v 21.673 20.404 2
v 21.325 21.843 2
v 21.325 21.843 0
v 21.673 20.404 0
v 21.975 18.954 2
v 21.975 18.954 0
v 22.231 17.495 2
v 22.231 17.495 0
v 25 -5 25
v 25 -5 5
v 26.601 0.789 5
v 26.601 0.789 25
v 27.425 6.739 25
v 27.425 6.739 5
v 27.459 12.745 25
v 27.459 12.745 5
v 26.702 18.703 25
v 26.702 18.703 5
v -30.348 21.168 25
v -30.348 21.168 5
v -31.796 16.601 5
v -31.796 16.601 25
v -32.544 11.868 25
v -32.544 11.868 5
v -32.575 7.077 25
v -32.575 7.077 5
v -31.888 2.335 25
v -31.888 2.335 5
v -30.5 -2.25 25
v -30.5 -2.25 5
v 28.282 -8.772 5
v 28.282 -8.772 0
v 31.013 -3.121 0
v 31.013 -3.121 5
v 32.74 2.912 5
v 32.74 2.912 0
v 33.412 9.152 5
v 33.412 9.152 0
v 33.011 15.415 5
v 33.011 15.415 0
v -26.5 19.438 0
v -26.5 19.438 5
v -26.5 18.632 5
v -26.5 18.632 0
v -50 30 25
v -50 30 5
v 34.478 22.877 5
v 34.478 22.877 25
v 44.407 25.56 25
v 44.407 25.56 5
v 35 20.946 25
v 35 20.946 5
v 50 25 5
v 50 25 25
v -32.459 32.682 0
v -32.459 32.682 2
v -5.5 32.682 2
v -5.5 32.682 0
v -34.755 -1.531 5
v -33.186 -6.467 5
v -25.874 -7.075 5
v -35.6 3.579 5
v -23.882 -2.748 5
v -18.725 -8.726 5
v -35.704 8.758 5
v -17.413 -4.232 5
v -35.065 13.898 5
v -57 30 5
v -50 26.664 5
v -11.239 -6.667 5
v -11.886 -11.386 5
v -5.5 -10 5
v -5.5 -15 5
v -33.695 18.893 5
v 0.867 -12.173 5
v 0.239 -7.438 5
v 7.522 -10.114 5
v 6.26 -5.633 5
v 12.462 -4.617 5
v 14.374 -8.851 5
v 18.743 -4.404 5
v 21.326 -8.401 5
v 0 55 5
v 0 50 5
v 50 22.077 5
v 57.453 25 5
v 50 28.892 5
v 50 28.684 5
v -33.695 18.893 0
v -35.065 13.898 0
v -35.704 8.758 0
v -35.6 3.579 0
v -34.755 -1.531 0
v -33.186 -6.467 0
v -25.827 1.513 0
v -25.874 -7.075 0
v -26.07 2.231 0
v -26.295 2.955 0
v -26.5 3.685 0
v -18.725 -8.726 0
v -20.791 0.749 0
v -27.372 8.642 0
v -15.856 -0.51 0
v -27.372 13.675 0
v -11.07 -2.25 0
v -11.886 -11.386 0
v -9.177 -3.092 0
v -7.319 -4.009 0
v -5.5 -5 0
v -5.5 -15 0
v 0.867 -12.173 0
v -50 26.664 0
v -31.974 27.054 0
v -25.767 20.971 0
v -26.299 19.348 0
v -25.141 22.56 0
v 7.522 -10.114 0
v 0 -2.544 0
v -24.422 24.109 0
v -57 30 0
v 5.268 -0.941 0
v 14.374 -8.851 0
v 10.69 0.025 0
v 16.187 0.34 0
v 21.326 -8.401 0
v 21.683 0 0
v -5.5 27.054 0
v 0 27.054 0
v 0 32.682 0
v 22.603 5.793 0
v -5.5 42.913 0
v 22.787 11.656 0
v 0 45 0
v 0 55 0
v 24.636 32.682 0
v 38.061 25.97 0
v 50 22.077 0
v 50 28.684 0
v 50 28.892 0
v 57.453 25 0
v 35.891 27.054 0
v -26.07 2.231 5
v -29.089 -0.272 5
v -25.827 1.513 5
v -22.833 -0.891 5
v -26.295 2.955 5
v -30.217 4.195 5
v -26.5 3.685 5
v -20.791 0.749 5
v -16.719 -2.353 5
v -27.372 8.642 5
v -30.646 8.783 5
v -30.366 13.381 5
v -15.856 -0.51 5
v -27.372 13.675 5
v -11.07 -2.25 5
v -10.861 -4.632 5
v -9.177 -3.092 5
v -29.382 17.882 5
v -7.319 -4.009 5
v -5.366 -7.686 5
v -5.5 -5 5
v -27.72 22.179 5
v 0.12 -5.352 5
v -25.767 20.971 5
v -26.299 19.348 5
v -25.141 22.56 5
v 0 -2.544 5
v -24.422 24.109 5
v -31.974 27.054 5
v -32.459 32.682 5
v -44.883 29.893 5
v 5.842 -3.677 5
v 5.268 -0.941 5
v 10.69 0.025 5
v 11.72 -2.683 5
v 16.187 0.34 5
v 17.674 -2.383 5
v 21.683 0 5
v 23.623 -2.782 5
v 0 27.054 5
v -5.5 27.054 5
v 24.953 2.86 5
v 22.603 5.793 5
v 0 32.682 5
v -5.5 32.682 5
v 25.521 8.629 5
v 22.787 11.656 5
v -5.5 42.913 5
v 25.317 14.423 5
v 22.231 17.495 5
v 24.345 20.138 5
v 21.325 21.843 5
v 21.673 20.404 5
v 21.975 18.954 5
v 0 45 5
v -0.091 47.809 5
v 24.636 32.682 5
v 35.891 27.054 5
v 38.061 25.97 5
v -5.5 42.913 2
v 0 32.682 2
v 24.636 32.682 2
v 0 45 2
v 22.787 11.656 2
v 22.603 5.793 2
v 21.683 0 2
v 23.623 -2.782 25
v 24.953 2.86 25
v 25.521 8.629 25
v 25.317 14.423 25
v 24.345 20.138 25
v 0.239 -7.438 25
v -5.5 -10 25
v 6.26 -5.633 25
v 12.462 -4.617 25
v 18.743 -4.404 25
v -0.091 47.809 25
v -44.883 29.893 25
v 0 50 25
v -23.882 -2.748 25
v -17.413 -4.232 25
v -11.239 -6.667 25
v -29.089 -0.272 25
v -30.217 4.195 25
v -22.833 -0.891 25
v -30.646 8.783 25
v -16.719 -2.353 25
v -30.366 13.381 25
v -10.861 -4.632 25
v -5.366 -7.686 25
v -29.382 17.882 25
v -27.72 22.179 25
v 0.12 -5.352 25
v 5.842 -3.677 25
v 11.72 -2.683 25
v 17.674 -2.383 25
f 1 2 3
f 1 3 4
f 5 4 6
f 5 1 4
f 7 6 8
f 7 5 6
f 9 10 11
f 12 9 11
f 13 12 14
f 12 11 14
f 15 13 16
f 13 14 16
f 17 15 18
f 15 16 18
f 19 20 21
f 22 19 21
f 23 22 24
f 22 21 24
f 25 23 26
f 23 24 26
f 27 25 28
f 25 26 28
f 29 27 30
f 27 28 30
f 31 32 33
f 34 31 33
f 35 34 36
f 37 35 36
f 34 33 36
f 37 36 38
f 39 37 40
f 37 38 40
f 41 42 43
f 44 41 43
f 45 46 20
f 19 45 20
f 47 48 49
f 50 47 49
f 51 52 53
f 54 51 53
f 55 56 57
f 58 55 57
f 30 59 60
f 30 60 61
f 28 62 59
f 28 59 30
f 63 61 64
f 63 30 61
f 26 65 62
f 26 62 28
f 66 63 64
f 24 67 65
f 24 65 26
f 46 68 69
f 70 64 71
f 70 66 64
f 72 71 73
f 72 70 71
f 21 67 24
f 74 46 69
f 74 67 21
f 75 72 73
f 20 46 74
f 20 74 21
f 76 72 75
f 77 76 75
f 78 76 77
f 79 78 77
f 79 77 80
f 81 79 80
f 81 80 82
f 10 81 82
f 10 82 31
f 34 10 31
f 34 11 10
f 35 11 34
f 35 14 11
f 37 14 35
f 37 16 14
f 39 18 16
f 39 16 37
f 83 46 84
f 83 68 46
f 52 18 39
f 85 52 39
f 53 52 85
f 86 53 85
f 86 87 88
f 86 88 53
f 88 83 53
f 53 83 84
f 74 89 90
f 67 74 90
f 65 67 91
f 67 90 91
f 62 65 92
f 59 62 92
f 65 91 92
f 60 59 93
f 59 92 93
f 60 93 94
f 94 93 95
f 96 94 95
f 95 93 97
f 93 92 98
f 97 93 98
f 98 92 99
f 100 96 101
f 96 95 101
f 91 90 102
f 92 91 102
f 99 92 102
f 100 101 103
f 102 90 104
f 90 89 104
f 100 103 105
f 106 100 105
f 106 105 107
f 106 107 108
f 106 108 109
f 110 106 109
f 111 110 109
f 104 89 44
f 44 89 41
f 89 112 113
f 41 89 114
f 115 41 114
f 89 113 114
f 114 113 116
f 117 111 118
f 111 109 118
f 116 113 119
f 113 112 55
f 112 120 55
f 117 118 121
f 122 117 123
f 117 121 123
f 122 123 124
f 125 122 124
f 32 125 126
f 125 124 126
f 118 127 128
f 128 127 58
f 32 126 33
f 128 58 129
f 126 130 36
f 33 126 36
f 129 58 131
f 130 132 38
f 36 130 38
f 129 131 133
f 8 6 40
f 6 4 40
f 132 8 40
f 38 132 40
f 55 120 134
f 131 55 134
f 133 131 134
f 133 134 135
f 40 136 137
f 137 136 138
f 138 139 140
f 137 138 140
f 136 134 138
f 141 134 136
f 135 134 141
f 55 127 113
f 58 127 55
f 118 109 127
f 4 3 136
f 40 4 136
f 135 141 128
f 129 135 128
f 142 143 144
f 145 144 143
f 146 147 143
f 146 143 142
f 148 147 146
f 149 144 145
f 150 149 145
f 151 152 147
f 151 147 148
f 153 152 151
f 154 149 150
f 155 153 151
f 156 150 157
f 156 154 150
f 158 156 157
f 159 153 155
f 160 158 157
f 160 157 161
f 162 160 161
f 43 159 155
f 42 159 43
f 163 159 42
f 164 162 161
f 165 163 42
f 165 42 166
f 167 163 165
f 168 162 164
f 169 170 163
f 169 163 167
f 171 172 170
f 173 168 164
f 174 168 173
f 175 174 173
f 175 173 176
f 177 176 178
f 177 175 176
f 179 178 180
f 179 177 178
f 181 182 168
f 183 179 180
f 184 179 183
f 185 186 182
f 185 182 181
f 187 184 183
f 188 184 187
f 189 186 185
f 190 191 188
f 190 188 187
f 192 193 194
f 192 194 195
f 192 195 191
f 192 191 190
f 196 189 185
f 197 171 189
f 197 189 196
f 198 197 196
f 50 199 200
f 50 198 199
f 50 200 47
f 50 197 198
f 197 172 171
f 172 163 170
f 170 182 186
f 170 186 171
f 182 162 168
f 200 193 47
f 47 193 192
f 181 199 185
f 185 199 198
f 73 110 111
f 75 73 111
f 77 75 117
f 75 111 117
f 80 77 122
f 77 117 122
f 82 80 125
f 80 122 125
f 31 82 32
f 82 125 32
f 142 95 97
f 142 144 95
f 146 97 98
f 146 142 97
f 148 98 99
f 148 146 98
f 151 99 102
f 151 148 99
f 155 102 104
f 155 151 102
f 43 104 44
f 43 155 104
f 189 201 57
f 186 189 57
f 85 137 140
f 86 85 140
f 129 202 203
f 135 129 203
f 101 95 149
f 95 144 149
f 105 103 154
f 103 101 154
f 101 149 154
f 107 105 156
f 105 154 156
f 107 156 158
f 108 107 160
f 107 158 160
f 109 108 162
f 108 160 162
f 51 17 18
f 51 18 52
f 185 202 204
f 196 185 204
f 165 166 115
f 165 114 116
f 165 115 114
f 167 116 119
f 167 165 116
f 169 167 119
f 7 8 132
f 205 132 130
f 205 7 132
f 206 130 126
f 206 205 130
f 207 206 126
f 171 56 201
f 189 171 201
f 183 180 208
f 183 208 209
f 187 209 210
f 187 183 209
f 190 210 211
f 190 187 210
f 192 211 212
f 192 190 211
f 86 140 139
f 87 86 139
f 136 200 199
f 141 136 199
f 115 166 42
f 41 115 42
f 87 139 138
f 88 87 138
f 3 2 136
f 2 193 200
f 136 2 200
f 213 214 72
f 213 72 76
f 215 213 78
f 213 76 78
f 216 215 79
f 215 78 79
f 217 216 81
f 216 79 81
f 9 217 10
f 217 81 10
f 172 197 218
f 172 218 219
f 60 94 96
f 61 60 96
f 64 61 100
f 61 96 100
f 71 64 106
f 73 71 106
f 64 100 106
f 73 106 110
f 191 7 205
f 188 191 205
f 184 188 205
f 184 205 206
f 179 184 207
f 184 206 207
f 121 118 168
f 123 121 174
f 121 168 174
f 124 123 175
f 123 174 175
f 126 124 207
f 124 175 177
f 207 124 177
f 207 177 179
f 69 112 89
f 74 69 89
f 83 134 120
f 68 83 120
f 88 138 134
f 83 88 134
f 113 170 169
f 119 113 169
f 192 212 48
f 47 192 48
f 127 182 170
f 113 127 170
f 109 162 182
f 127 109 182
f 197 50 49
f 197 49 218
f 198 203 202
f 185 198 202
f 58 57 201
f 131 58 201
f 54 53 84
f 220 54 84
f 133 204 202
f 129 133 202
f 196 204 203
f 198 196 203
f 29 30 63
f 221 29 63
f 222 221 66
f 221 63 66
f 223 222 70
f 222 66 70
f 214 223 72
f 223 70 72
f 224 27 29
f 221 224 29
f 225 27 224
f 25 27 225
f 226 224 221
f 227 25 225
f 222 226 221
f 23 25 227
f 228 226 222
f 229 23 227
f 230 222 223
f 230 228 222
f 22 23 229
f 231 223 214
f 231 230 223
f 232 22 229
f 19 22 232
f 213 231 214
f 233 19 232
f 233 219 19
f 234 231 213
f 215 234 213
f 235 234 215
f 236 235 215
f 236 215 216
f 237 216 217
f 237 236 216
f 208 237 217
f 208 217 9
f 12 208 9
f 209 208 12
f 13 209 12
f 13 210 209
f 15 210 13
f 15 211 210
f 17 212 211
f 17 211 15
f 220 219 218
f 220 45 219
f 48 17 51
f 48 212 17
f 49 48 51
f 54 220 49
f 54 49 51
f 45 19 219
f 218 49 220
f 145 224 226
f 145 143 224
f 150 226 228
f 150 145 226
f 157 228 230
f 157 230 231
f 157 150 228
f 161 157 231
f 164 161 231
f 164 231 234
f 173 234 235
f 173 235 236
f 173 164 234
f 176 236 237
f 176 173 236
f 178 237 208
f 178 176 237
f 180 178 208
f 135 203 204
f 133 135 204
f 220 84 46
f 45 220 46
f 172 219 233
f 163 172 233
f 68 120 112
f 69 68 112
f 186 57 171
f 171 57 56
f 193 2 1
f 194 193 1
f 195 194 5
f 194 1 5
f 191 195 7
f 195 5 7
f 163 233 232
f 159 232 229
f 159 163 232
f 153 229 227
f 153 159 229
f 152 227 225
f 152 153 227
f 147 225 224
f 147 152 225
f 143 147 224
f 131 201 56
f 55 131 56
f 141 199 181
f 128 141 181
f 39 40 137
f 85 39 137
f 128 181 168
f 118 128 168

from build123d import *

# Parameters (mm, degrees)
F1_DEPTH = 25
F2_T     = -2
F3_DEPTH = 5
F4_DEPTH = 2.001


with BuildPart() as f1:
    # F0 (on Top) → F1 (new body)
    with BuildSketch(Plane.XY):
        with BuildLine():
            Line((50, 25), (0, 50))
            Line((0, 50), (-50, 30))
            Line((-50, 30), (-30.3478781134, 21.1675856689))
            ThreePointArc((-30.3478781134, 21.1675856689), (-32.6493723673, 9.4732493681), (-30.5, -2.25))
            Line((-30.5, -2.25), (-26.5, -2.25))
            Line((-26.5, -2.25), (-26.5, 3.6853529656))
            ThreePointArc((-26.5, 3.6853529656), (-27.4818472664, 11.1586005985), (-26.5, 18.6318482313))
            Line((-26.5, 18.6318482313), (-26.5, 19.4382022472))
            Line((-26.5, 19.4382022472), (-26.2986962157, 19.3477286363))
            ThreePointArc((-26.2986962157, 19.3477286363), (-25.4656340579, 21.7699494798), (-24.4215968996, 24.1089947522))
            Line((-24.4215968996, 24.1089947522), (-31.9740222767, 27.0544973761))
            Line((-31.9740222767, 27.0544973761), (-39.5264476538, 30))
            Line((-39.5264476538, 30), (-32.4590496756, 32.6820262372))
            Line((-32.4590496756, 32.6820262372), (-5.5, 42.9127899192))
            Line((-5.5, 42.9127899192), (0, 45))
            Line((0, 45), (24.6359475255, 32.6820262372))
            Line((24.6359475255, 32.6820262372), (35.8910052478, 27.0544973761))
            Line((35.8910052478, 27.0544973761), (38.0609311461, 25.9695344269))
            Line((38.0609311461, 25.9695344269), (34.1284329528, 25))
            Line((34.1284329528, 25), (25.6717936096, 22.915065036))
            ThreePointArc((25.6717936096, 22.915065036), (26.2373168575, 20.8214995062), (26.7024967211, 18.7033774922))
            Line((26.7024967211, 18.7033774922), (35, 20.9459459459))
            Line((35, 20.9459459459), (50, 25))
        make_face()
        with BuildLine():
            Line((-26.5, 3.6853529656), (-26.5, -2.25))
            Line((-26.5, -2.25), (-11.0695765548, -2.25))
            ThreePointArc((-11.0695765548, -2.25), (-18.3080653559, 0.1805256036), (-25.8265792788, 1.5128631071))
            ThreePointArc((-25.8265792788, 1.5128631071), (-26.1846465442, 2.5924878985), (-26.5, 3.6853529656))
        make_face()
        with BuildLine():
            ThreePointArc((25, -5), (27.4252333214, 6.7386371679), (26.7024967211, 18.7033774922))
            Line((26.7024967211, 18.7033774922), (22.2313324849, 17.4949547256))
            ThreePointArc((22.2313324849, 17.4949547256), (22.7872104866, 8.7214855275), (21.6833752096, 0))
            ThreePointArc((21.6833752096, 0), (10.6895547346, 0.0246300535), (0, -2.5440495396))
            ThreePointArc((0, -2.5440495396), (-2.7899905559, -3.6824675653), (-5.5, -5))
            Line((-5.5, -5), (-5.5, -10))
            ThreePointArc((-5.5, -10), (9.3443058496, -5.0252656824), (25, -5))
        make_face()
        with BuildLine():
            Line((-26.5, -2.25), (-30.5, -2.25))
            ThreePointArc((-30.5, -2.25), (-17.4131506848, -4.2319376927), (-5.5, -10))
            Line((-5.5, -10), (-5.5, -5))
            ThreePointArc((-5.5, -5), (-8.2432452262, -3.5408628349), (-11.0695765548, -2.25))
            Line((-11.0695765548, -2.25), (-26.5, -2.25))
        make_face()
        with BuildLine():
            Line((-5.5, -2.25), (-11.0695765548, -2.25))
            ThreePointArc((-11.0695765548, -2.25), (-8.2432452262, -3.5408628349), (-5.5, -5))
            Line((-5.5, -5), (-5.5, -2.25))
        make_face()
        with BuildLine():
            Line((-5.5, -2.25), (-5.5, -5))
            ThreePointArc((-5.5, -5), (-2.7899905559, -3.6824675653), (0, -2.5440495396))
            Line((0, -2.5440495396), (0, 10))
            Line((0, 10), (0, 15))
            Line((0, 15), (0, 25))
            Line((0, 25), (0, 27.0544973761))
            Line((0, 27.0544973761), (0, 30))
            Line((0, 30), (0, 32.6820262372))
            Line((0, 32.6820262372), (0, 45))
            Line((0, 45), (-5.5, 42.9127899192))
            Line((-5.5, 42.9127899192), (-5.5, 32.6820262372))
            Line((-5.5, 32.6820262372), (-32.4590496756, 32.6820262372))
            Line((-32.4590496756, 32.6820262372), (-39.5264476538, 30))
            Line((-39.5264476538, 30), (-31.9740222767, 27.0544973761))
            Line((-31.9740222767, 27.0544973761), (-5.5, 27.0544973761))
            Line((-5.5, 27.0544973761), (-5.5, -2.25))
        make_face()
        with BuildLine():
            Line((21.3245172054, 21.8432694674), (25.6717936096, 22.915065036))
            Line((25.6717936096, 22.915065036), (34.1284329528, 25))
            Line((34.1284329528, 25), (38.0609311461, 25.9695344269))
            Line((38.0609311461, 25.9695344269), (35.8910052478, 27.0544973761))
            Line((35.8910052478, 27.0544973761), (0, 27.0544973761))
            Line((0, 27.0544973761), (0, 25))
            Line((0, 25), (0, 15))
            Line((0, 15), (0, 10))
            Line((0, 10), (0, -2.5440495396))
            ThreePointArc((0, -2.5440495396), (10.6895547346, 0.0246300535), (21.6833752096, 0))
            ThreePointArc((21.6833752096, 0), (22.7872104866, 8.7214855275), (22.2313324849, 17.4949547256))
            ThreePointArc((22.2313324849, 17.4949547256), (21.8298295871, 19.6799365229), (21.3245172054, 21.8432694674))
        make_face()
        with BuildLine():
            Line((22.2313324849, 17.4949547256), (26.7024967211, 18.7033774922))
            ThreePointArc((26.7024967211, 18.7033774922), (26.2373168575, 20.8214995062), (25.6717936096, 22.915065036))
            Line((25.6717936096, 22.915065036), (21.3245172054, 21.8432694674))
            ThreePointArc((21.3245172054, 21.8432694674), (21.8298295871, 19.6799365229), (22.2313324849, 17.4949547256))
        make_face()
        Polygon((0, 27.0544973761), (35.8910052478, 27.0544973761), (24.6359475255, 32.6820262372), (0, 32.6820262372), (0, 30), align=None)
        Polygon((0, 32.6820262372), (24.6359475255, 32.6820262372), (0, 45), align=None)
        Polygon((-5.5, 32.6820262372), (-5.5, 42.9127899192), (-32.4590496756, 32.6820262372), align=None)
        with BuildLine():
            ThreePointArc((-25.8265792788, 1.5128631071), (-18.3080653559, 0.1805256036), (-11.0695765548, -2.25))
            Line((-11.0695765548, -2.25), (-5.5, -2.25))
            Line((-5.5, -2.25), (-5.5, 27.0544973761))
            Line((-5.5, 27.0544973761), (-31.9740222767, 27.0544973761))
            Line((-31.9740222767, 27.0544973761), (-24.4215968996, 24.1089947522))
            ThreePointArc((-24.4215968996, 24.1089947522), (-25.4656340579, 21.7699494798), (-26.2986962157, 19.3477286363))
            ThreePointArc((-26.2986962157, 19.3477286363), (-26.4016482615, 18.9904352313), (-26.5, 18.6318482313))
            ThreePointArc((-26.5, 18.6318482313), (-27.4818472664, 11.1586005985), (-26.5, 3.6853529656))
            ThreePointArc((-26.5, 3.6853529656), (-26.1846465442, 2.5924878985), (-25.8265792788, 1.5128631071))
        make_face()
        with BuildLine():
            Line((-26.5, 19.4382022472), (-26.5, 18.6318482313))
            ThreePointArc((-26.5, 18.6318482313), (-26.4016482615, 18.9904352313), (-26.2986962157, 19.3477286363))
            Line((-26.2986962157, 19.3477286363), (-26.5, 19.4382022472))
        make_face()
    extrude(amount=F1_DEPTH)

    # F2
    f2_openings = [f1.faces().sort_by_distance(p)[0] for p in [
        (-1.454466, 20.176979, 25),
    ]]
    offset(amount=F2_T, openings=f2_openings, kind=Kind.INTERSECTION)

    # F0 (on Top) → F3 (join)
    with BuildSketch(Plane.XY):
        with BuildLine():
            Line((50, 22.0773804358), (50, 25))
            Line((50, 25), (35, 20.9459459459))
            Line((35, 20.9459459459), (26.7024967211, 18.7033774922))
            ThreePointArc((26.7024967211, 18.7033774922), (27.4252333214, 6.7386371679), (25, -5))
            ThreePointArc((25, -5), (9.3443058496, -5.0252656824), (-5.5, -10))
            Line((-5.5, -10), (-5.5, -15))
            ThreePointArc((-5.5, -15), (10.9294258994, -9.3812200513), (28.2823865676, -8.7717288371))
            ThreePointArc((28.2823865676, -8.7717288371), (32.739691971, 2.91239876), (33.0105349422, 15.4149206355))
            Line((33.0105349422, 15.4149206355), (50, 22.0773804358))
        make_face()
        Polygon((50, 28.6842105263), (9.5, 50), (0, 50), (50, 25), align=None)
        Polygon((0, 50), (9.5, 50), (0, 55), (-11.4, 50), align=None)
        Polygon((-50, 30), (0, 50), (-11.4, 50), (-50, 33.0701754386), align=None)
        Polygon((-50, 26.6638008012), (-50, 30), (-50, 33.0701754386), (-57, 30), align=None)
        with BuildLine():
            Line((-30.3478781134, 21.1675856689), (-50, 30))
            Line((-50, 30), (-50, 26.6638008012))
            Line((-50, 26.6638008012), (-33.6950486526, 18.8928628554))
            ThreePointArc((-33.6950486526, 18.8928628554), (-35.7455733347, 6.1667010563), (-33.1864199092, -6.467007004))
            ThreePointArc((-33.1864199092, -6.467007004), (-18.7245752181, -8.7262616008), (-5.5, -15))
            Line((-5.5, -15), (-5.5, -10))
            ThreePointArc((-5.5, -10), (-17.4131506848, -4.2319376927), (-30.5, -2.25))
            ThreePointArc((-30.5, -2.25), (-32.6493723673, 9.4732493681), (-30.3478781134, 21.1675856689))
        make_face()
        with BuildLine():
            ThreePointArc((25, -5), (27.4252333214, 6.7386371679), (26.7024967211, 18.7033774922))
            Line((26.7024967211, 18.7033774922), (22.2313324849, 17.4949547256))
            ThreePointArc((22.2313324849, 17.4949547256), (22.7872104866, 8.7214855275), (21.6833752096, 0))
            ThreePointArc((21.6833752096, 0), (10.6895547346, 0.0246300535), (0, -2.5440495396))
            ThreePointArc((0, -2.5440495396), (-2.7899905559, -3.6824675653), (-5.5, -5))
            Line((-5.5, -5), (-5.5, -10))
            ThreePointArc((-5.5, -10), (9.3443058496, -5.0252656824), (25, -5))
        make_face()
        with BuildLine():
            Line((-26.5, -2.25), (-30.5, -2.25))
            ThreePointArc((-30.5, -2.25), (-17.4131506848, -4.2319376927), (-5.5, -10))
            Line((-5.5, -10), (-5.5, -5))
            ThreePointArc((-5.5, -5), (-8.2432452262, -3.5408628349), (-11.0695765548, -2.25))
            Line((-11.0695765548, -2.25), (-26.5, -2.25))
        make_face()
        with BuildLine():
            Line((-26.5, 3.6853529656), (-26.5, -2.25))
            Line((-26.5, -2.25), (-11.0695765548, -2.25))
            ThreePointArc((-11.0695765548, -2.25), (-18.3080653559, 0.1805256036), (-25.8265792788, 1.5128631071))
            ThreePointArc((-25.8265792788, 1.5128631071), (-26.1846465442, 2.5924878985), (-26.5, 3.6853529656))
        make_face()
        with BuildLine():
            Line((50, 25), (0, 50))
            Line((0, 50), (-50, 30))
            Line((-50, 30), (-30.3478781134, 21.1675856689))
            ThreePointArc((-30.3478781134, 21.1675856689), (-32.6493723673, 9.4732493681), (-30.5, -2.25))
            Line((-30.5, -2.25), (-26.5, -2.25))
            Line((-26.5, -2.25), (-26.5, 3.6853529656))
            ThreePointArc((-26.5, 3.6853529656), (-27.4818472664, 11.1586005985), (-26.5, 18.6318482313))
            Line((-26.5, 18.6318482313), (-26.5, 19.4382022472))
            Line((-26.5, 19.4382022472), (-26.2986962157, 19.3477286363))
            ThreePointArc((-26.2986962157, 19.3477286363), (-25.4656340579, 21.7699494798), (-24.4215968996, 24.1089947522))
            Line((-24.4215968996, 24.1089947522), (-31.9740222767, 27.0544973761))
            Line((-31.9740222767, 27.0544973761), (-39.5264476538, 30))
            Line((-39.5264476538, 30), (-32.4590496756, 32.6820262372))
            Line((-32.4590496756, 32.6820262372), (-5.5, 42.9127899192))
            Line((-5.5, 42.9127899192), (0, 45))
            Line((0, 45), (24.6359475255, 32.6820262372))
            Line((24.6359475255, 32.6820262372), (35.8910052478, 27.0544973761))
            Line((35.8910052478, 27.0544973761), (38.0609311461, 25.9695344269))
            Line((38.0609311461, 25.9695344269), (34.1284329528, 25))
            Line((34.1284329528, 25), (25.6717936096, 22.915065036))
            ThreePointArc((25.6717936096, 22.915065036), (26.2373168575, 20.8214995062), (26.7024967211, 18.7033774922))
            Line((26.7024967211, 18.7033774922), (35, 20.9459459459))
            Line((35, 20.9459459459), (50, 25))
        make_face()
        with BuildLine():
            Line((22.2313324849, 17.4949547256), (26.7024967211, 18.7033774922))
            ThreePointArc((26.7024967211, 18.7033774922), (26.2373168575, 20.8214995062), (25.6717936096, 22.915065036))
            Line((25.6717936096, 22.915065036), (21.3245172054, 21.8432694674))
            ThreePointArc((21.3245172054, 21.8432694674), (21.8298295871, 19.6799365229), (22.2313324849, 17.4949547256))
        make_face()
        with BuildLine():
            Line((-5.5, -2.25), (-5.5, -5))
            ThreePointArc((-5.5, -5), (-2.7899905559, -3.6824675653), (0, -2.5440495396))
            Line((0, -2.5440495396), (0, 10))
            Line((0, 10), (0, 15))
            Line((0, 15), (0, 25))
            Line((0, 25), (0, 27.0544973761))
            Line((0, 27.0544973761), (0, 30))
            Line((0, 30), (0, 32.6820262372))
            Line((0, 32.6820262372), (0, 45))
            Line((0, 45), (-5.5, 42.9127899192))
            Line((-5.5, 42.9127899192), (-5.5, 32.6820262372))
            Line((-5.5, 32.6820262372), (-32.4590496756, 32.6820262372))
            Line((-32.4590496756, 32.6820262372), (-39.5264476538, 30))
            Line((-39.5264476538, 30), (-31.9740222767, 27.0544973761))
            Line((-31.9740222767, 27.0544973761), (-5.5, 27.0544973761))
            Line((-5.5, 27.0544973761), (-5.5, -2.25))
        make_face()
        Polygon((0, 27.0544973761), (35.8910052478, 27.0544973761), (24.6359475255, 32.6820262372), (0, 32.6820262372), (0, 30), align=None)
        Polygon((57.4527643621, 25), (50, 28.8915957021), (50, 28.6842105263), (50, 25), (50, 22.0773804358), align=None)
    extrude(amount=F3_DEPTH)

    # F4 (cut, through all): faces of the model
    f4_faces = [f1.faces().sort_by_distance(p)[0] for p in [
        (-15.7903143364, 13.0391590312, 2),
        (12.2322076689, 14.1398784717, 2),
        (8.2119825085, 36.7880174915, 2),
        (-14.4863498919, 36.0922807979, 2),
    ]]
    extrude(f4_faces, amount=-F4_DEPTH, mode=Mode.SUBTRACT)


solid = f1.part
